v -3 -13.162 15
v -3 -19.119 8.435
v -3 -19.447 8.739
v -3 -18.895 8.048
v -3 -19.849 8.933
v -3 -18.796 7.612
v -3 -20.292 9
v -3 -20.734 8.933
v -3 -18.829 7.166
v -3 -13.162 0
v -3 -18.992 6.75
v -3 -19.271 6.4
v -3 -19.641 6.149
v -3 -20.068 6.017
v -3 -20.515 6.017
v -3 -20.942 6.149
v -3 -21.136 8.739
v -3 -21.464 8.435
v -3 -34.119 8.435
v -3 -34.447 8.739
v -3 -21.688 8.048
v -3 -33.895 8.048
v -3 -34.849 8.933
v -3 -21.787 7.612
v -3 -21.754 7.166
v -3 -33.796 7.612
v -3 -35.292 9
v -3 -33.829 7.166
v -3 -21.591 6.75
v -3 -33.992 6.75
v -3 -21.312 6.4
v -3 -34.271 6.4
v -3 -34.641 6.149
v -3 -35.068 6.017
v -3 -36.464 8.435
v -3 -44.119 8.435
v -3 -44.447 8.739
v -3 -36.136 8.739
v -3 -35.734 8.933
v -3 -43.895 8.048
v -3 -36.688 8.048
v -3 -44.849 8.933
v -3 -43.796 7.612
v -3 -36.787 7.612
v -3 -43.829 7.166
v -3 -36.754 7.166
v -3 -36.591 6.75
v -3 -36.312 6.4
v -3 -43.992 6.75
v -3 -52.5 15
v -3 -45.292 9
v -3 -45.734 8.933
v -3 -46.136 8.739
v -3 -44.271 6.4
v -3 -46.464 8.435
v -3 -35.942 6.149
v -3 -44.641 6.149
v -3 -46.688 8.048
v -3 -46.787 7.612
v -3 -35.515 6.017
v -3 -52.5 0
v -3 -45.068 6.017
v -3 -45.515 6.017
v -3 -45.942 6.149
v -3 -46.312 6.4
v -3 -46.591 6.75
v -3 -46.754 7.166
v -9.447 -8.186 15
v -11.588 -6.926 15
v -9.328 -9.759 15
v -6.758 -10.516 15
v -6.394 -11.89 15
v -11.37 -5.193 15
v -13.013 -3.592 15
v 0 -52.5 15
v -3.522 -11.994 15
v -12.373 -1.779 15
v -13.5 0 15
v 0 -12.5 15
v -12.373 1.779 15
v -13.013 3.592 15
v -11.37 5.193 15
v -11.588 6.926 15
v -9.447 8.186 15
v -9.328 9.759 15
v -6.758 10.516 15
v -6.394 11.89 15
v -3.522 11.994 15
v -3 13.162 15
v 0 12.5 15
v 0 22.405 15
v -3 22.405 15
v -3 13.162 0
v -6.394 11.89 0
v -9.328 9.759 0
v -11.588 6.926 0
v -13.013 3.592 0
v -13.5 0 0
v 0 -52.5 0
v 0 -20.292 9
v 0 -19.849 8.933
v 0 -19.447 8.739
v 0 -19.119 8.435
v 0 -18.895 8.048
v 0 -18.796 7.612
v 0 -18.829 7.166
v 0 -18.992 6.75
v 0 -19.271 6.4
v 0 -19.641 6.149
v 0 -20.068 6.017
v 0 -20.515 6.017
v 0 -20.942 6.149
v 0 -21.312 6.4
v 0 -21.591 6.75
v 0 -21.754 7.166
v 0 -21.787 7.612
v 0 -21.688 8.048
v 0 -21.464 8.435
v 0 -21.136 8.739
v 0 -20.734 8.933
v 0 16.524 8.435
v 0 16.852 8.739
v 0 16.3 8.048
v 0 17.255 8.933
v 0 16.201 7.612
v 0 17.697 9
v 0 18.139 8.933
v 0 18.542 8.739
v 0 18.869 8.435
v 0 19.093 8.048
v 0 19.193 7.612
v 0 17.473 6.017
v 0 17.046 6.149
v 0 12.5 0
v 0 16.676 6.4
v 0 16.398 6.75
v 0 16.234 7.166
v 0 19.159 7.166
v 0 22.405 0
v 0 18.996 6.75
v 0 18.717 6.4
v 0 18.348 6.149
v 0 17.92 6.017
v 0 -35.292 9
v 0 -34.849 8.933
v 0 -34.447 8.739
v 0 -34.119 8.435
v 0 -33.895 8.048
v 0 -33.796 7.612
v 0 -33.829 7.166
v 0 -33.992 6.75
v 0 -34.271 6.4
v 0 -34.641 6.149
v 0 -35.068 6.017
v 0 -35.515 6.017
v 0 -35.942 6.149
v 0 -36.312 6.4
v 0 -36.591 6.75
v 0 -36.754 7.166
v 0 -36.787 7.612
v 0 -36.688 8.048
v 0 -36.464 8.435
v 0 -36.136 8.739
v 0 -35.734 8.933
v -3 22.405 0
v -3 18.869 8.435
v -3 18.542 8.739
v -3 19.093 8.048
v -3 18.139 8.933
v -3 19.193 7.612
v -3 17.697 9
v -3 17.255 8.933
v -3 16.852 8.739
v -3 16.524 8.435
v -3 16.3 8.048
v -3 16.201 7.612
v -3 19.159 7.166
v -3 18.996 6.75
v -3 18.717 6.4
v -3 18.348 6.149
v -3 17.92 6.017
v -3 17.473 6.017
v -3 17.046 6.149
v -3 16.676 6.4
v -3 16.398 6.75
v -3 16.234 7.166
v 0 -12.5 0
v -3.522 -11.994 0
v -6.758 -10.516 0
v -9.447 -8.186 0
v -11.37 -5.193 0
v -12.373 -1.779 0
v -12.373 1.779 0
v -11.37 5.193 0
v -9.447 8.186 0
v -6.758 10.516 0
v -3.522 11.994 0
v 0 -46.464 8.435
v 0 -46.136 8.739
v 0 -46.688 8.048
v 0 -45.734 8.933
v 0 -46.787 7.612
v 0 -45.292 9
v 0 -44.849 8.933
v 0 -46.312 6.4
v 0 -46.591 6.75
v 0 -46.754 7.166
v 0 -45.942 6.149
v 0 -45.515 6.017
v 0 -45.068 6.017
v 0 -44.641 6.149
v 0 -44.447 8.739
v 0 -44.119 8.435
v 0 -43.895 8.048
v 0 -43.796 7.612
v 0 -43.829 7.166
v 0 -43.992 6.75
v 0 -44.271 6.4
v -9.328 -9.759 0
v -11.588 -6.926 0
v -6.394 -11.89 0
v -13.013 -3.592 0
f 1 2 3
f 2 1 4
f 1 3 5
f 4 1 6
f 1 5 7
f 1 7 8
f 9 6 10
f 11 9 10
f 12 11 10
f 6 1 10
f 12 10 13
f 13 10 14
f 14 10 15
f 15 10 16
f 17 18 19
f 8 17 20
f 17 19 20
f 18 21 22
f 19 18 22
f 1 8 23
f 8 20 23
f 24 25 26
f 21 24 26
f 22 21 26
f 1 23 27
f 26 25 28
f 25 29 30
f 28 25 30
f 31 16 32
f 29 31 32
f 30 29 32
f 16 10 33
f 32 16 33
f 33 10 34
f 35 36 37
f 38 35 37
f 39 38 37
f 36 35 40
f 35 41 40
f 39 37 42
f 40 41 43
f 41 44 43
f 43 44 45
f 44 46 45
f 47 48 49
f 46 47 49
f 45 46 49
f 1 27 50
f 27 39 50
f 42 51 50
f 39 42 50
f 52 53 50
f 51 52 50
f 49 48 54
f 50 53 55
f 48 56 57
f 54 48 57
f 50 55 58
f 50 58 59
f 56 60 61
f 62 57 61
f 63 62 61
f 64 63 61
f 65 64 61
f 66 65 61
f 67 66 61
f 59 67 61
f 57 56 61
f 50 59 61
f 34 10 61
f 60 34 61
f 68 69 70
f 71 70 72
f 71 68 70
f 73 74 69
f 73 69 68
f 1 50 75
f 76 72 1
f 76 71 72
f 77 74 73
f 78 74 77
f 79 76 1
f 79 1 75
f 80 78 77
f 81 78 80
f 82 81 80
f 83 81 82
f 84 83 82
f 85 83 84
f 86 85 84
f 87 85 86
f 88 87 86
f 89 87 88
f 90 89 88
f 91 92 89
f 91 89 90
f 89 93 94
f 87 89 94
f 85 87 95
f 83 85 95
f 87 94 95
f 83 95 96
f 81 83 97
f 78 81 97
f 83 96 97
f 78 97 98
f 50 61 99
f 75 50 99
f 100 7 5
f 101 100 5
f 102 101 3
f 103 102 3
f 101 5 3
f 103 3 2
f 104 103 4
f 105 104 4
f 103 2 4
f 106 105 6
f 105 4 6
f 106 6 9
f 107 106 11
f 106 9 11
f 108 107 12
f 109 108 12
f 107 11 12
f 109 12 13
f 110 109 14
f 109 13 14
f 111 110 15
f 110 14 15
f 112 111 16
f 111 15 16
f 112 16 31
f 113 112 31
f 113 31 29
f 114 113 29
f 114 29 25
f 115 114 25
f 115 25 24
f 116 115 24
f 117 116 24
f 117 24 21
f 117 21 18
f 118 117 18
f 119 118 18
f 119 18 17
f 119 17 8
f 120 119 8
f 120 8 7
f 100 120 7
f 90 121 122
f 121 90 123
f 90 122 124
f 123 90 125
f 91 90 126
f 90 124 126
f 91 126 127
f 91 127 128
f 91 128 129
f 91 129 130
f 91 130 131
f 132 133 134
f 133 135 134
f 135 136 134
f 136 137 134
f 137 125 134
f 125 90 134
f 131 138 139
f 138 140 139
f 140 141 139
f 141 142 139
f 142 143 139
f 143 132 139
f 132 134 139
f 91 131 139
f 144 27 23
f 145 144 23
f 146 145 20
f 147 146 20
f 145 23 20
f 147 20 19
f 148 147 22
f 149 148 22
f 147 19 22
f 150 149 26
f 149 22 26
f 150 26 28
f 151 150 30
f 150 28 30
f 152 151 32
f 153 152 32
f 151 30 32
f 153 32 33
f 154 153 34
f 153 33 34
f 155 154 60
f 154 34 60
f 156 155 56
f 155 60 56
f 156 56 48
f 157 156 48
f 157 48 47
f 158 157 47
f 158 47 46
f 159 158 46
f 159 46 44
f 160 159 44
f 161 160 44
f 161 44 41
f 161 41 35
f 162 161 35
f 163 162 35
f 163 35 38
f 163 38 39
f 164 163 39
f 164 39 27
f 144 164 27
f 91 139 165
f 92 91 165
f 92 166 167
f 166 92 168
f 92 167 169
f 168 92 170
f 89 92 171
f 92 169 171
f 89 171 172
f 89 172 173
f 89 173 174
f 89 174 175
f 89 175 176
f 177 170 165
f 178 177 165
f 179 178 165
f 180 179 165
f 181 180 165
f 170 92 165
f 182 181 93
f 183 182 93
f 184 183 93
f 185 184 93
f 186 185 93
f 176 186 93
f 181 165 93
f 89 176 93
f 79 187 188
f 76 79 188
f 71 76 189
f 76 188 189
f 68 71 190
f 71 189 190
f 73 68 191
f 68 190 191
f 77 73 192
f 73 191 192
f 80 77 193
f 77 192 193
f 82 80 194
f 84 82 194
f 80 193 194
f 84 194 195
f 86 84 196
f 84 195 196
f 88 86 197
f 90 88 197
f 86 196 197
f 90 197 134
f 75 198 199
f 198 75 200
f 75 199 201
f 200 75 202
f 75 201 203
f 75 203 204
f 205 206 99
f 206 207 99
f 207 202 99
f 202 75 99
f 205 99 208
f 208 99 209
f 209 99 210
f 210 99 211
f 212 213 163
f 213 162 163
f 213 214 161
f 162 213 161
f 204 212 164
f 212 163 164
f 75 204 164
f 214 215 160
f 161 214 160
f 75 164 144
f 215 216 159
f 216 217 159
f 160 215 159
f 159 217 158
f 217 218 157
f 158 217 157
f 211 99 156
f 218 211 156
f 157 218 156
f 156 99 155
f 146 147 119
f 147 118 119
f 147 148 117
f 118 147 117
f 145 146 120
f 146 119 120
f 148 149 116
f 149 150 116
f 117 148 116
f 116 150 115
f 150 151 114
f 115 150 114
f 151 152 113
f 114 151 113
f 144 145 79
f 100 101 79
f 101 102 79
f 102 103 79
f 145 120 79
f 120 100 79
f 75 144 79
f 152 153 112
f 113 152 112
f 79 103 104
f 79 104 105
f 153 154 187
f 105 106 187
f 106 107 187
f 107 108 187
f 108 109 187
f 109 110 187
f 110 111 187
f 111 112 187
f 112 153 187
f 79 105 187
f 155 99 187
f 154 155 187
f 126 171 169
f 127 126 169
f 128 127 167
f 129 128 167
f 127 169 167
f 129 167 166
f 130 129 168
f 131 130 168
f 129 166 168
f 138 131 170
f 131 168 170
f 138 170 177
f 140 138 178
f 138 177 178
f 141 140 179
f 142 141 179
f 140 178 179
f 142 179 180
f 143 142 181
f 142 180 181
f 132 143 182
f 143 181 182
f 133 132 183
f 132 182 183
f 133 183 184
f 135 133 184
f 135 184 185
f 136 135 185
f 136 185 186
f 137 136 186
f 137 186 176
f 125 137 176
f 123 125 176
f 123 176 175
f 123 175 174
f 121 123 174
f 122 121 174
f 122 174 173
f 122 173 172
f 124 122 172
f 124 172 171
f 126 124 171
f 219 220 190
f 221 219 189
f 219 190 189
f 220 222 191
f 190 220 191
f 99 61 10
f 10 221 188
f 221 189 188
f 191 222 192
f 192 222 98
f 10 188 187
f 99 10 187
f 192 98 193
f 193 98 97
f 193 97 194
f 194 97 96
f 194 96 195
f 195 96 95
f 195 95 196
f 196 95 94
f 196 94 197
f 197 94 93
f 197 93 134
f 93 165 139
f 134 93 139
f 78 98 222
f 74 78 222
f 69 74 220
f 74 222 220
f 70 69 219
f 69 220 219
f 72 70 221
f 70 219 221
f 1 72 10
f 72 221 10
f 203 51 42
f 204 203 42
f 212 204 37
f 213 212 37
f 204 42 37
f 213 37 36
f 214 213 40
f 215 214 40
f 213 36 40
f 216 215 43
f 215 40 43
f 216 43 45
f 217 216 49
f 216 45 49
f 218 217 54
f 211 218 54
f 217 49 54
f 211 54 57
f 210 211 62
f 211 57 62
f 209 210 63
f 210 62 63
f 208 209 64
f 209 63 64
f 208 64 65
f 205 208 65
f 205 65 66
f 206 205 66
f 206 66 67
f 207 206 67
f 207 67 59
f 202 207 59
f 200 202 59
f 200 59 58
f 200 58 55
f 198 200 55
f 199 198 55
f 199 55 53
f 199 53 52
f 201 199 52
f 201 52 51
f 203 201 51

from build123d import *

# Parameters (mm, degrees)
EXTRUDE_1_DEPTH     = 15
SKETCH_2_R          = 1.5
CUT_EXTRUDE_1_DEPTH = 20


with BuildPart() as part:
    # 草图1 → 凸台-拉伸1 (new body)
    with BuildSketch(Plane.XY):
        with BuildLine():
            Line((-3, 22.405228465), (-3, 13.162446581))
            ThreePointArc((-3, 13.162446581), (-10.55343546, 8.41872912), (-13.5, 0))
            ThreePointArc((-13.5, 0), (-10.55343546, -8.41872912), (-3, -13.162446581))
            Line((-3, -13.162446581), (-3, -52.5))
            Line((-3, -52.5), (0, -52.5))
            Line((0, -52.5), (0, -12.5))
            ThreePointArc((0, -12.5), (-12.5, 0), (0, 12.5))
            Line((0, 12.5), (0, 22.405228465))
            Line((0, 22.405228465), (-3, 22.405228465))
        make_face()
    extrude(amount=EXTRUDE_1_DEPTH)

    # 草图2 → 切除-拉伸1 (cut)
    with BuildSketch(Plane.ZY.offset(3)):
        with Locations((7.5, 17.696731087)):
            Circle(SKETCH_2_R)
        with Locations((7.5, -20.291502622)):
            Circle(SKETCH_2_R)
        with Locations((7.5, -35.291502622)):
            Circle(SKETCH_2_R)
        with Locations((7.5, -45.291502622)):
            Circle(SKETCH_2_R)
    extrude(amount=-CUT_EXTRUDE_1_DEPTH, mode=Mode.SUBTRACT)


solid = part.part
